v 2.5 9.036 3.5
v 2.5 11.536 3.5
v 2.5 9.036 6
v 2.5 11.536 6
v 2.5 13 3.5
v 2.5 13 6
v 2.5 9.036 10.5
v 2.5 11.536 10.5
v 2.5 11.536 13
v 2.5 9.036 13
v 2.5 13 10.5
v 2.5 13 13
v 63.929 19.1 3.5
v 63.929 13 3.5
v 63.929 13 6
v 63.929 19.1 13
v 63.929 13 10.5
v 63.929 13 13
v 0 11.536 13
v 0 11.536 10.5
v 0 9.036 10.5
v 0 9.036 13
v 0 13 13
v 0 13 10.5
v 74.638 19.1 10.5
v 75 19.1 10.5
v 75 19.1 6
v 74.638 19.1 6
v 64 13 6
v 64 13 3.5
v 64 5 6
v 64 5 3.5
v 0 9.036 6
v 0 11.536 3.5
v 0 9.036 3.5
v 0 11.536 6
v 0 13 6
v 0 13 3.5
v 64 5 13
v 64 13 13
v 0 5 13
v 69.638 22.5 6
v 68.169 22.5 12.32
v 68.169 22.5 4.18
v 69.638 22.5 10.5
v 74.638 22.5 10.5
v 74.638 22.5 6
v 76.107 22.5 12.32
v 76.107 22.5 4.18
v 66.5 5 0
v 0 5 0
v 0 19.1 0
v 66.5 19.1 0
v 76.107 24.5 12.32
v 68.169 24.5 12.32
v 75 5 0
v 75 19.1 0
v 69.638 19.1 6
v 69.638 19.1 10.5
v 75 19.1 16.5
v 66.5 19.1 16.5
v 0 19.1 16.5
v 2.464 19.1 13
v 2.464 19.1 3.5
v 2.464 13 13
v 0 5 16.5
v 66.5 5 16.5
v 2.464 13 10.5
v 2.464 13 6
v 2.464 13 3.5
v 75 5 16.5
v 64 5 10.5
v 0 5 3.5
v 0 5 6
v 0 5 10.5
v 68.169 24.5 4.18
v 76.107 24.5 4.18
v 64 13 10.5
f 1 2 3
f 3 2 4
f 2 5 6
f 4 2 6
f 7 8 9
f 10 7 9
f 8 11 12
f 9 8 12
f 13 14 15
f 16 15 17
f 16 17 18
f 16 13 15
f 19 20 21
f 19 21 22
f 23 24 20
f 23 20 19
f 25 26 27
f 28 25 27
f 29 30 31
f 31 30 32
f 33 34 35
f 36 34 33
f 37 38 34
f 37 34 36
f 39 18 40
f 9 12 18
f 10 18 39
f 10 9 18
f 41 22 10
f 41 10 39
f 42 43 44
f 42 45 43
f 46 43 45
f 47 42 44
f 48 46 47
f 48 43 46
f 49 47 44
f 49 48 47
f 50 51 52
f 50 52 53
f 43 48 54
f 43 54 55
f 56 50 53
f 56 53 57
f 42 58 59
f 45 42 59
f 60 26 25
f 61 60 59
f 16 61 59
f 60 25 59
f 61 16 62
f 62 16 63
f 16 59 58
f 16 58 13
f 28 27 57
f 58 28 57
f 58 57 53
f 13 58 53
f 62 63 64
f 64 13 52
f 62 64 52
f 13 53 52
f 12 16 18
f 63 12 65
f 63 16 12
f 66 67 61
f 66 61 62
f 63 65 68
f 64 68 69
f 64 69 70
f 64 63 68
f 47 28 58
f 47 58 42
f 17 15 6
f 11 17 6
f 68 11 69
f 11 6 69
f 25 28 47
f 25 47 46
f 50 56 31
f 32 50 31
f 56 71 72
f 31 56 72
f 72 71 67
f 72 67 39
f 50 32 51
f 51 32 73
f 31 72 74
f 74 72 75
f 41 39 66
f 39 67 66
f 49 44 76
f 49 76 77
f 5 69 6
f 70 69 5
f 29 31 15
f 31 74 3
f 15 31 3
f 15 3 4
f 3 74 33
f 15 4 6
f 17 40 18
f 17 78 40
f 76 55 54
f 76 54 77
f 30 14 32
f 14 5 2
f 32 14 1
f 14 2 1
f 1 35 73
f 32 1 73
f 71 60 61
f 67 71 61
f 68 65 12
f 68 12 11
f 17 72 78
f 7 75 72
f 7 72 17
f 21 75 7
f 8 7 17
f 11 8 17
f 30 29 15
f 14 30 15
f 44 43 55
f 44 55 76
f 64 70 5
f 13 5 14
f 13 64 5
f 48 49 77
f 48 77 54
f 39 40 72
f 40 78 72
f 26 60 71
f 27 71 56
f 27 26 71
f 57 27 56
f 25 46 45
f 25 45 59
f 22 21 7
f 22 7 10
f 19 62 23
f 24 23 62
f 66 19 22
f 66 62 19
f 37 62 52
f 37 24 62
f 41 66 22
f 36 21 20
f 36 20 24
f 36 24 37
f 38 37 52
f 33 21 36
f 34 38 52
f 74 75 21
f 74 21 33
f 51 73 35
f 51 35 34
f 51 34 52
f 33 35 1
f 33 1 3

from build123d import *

# Parameters (mm, degrees)
BOSS_EXTRUDE1_DEPTH  = 13
CUT_EXTRUDE1_DEPTH   = 66.5
BOSS_EXTRUDE4_DEPTH  = 6.1
CUT_EXTRUDE2_DEPTH   = 6.1
BOSS_EXTRUDE6_DEPTH  = 2.5
BOSS_EXTRUDE7_DEPTH  = 2.5
BOSS_EXTRUDE8_DEPTH  = 19.1
BOSS_EXTRUDE12_DEPTH = 9.5
BOSS_EXTRUDE13_DEPTH = 2.5
CUT_EXTRUDE4_DEPTH   = 5
CUT_EXTRUDE5_DEPTH   = 6.5
BOSS_EXTRUDE14_DEPTH = 10
CUT_EXTRUDE7_DEPTH   = 13
CUT_EXTRUDE8_DEPTH   = 5
CUT_EXTRUDE9_DEPTH   = 5
BOSS_EXTRUDE15_DEPTH = 2


with BuildPart() as part:
    # 3DSketch1 → Boss-Extrude1 (new body)
    with BuildSketch(Plane(origin=(0, 0, 0), x_dir=(0.970570246541768, 0, 0.2408181814727695), z_dir=(0, 1, 0))):
        Polygon((0, 0), (64.542921395, 16.014409068), (68.516421389, 0), (3.973499994, -16.014409068), align=None)
    extrude(amount=BOSS_EXTRUDE1_DEPTH)

    # 3DSketch2 → Cut-Extrude1 (cut)
    with BuildSketch(Plane(origin=(0, 13, 3.5), x_dir=(0, -0.8073911222578979, 0.59001658934231), z_dir=(1, 0, 0))):
        Polygon((0, 0), (10.496084589, 7.670215661), (11.971126063, 5.651737856), (1.475041473, -2.018477806), align=None)
        Polygon((14.626200715, 2.018477806), (4.130116125, -5.651737856), (5.605157599, -7.670215661), (16.101242188, 0), align=None)
    extrude(amount=CUT_EXTRUDE1_DEPTH, mode=Mode.SUBTRACT)


with BuildPart() as cut_extrude1_piece_1:
    # of the separate pieces the step leaves, piece 1, a body of its own (cut_extrude1_pieces)
    add(part.part.solids().sort_by_distance((0, 0, 10.5))[0])



with BuildPart() as cut_extrude1_piece_2:
    # of the separate pieces the step leaves, piece 2, a body of its own (cut_extrude1_pieces)
    add(part.part.solids().sort_by_distance((0, 0, 16.5))[0])


with BuildPart() as cut_extrude1_piece_3:
    # of the separate pieces the step leaves, piece 3, a body of its own (cut_extrude1_pieces)
    add(part.part.solids().sort_by_distance((0, 0, 0))[0])


with BuildPart() as cut_extrude1_piece_1_1:
    add(cut_extrude1_piece_1.part)

    add(cut_extrude1_piece_2.part)  # Boss-Extrude4 merges Cut-Extrude1 piece 2

    add(cut_extrude1_piece_3.part)  # Boss-Extrude4 merges Cut-Extrude1 piece 3
    # 3DSketch3 → Boss-Extrude4 (add)
    with BuildSketch(Plane(origin=(0, 13, 0), x_dir=(0.970570246541768, 0, 0.2408181814727695), z_dir=(0, 1, 0))):
        Polygon((0, 0), (64.542921395, 16.014409068), (68.516421389, 0), (3.973499994, -16.014409068), align=None)
    extrude(amount=BOSS_EXTRUDE4_DEPTH)

    # 3DSketch4 → Cut-Extrude2 (cut)
    with BuildSketch(Plane(origin=(2.463625992, 19.1, 3.5), x_dir=(0.9882657761690827, 0, 0.15274408549243565), z_dir=(0, 1, 0))):
        Polygon((0, 0), (60.744465433, 9.388524874), (62.195534245, 0), (1.451068812, -9.388524874), align=None)
    extrude(amount=-CUT_EXTRUDE2_DEPTH, mode=Mode.SUBTRACT)

    # 3DSketch5 → Boss-Extrude6 (add)
    with BuildSketch(Plane(origin=(0, 13, 3.5), x_dir=(0, -0.38512437764181645, 0.9228646779165425), z_dir=(-1, 0, 0))):
        Polygon((0, 0), (0.564008213, -1.351519893), (1.526819157, -3.658681588), (3.833980852, -2.695870643), (2.871169908, -0.388708949), (2.307161695, 0.962810944), align=None)
        Polygon((6.460052745, 2.695870643), (7.024060958, 1.344350751), (7.986871902, -0.962810944), (10.294033597, 0), (9.331222653, 2.307161695), (8.76721444, 3.658681588), align=None)
    extrude(amount=-BOSS_EXTRUDE6_DEPTH)

    # 3DSketch6 → Boss-Extrude7 (add)
    with BuildSketch(Plane(origin=(66.5, 0, 13), x_dir=(0, 0.8073911222578979, -0.5900165893423102), z_dir=(-1, 0, 0))):
        Polygon((0, 0), (1.475041473, 2.018477806), (11.971126063, -5.651737856), (10.496084589, -7.670215661), align=None)
        Polygon((14.626200715, -2.018477806), (4.130116125, 5.651737856), (5.605157599, 7.670215661), (16.101242188, 0), align=None)
    extrude(amount=BOSS_EXTRUDE7_DEPTH)

    # 3DSketch7 → Boss-Extrude8 (add)
    with BuildSketch(Plane(origin=(66.5, 0, 0), x_dir=(0.7713732785400773, 0, 0.6363829547955637), z_dir=(0, 1, 0))):
        Polygon((0, 0), (15.427465571, 12.727659096), (25.927784325, 0), (10.500318754, -12.727659096), align=None)
    extrude(amount=BOSS_EXTRUDE8_DEPTH)

    # 3DSketch8 → Boss-Extrude12 (add)
    with BuildSketch(Plane(origin=(76.128891267, 13, 6), x_dir=(-0.9382075830120803, 0, 0.3460730142305674), z_dir=(0, 1, 0))):
        Polygon((0, 0), (1.557328564, 4.221934124), (-1.734607538, 5.436217903), (-3.291936102, 1.214283779), align=None)
    extrude(amount=BOSS_EXTRUDE12_DEPTH)

    # 3DSketch9 → Boss-Extrude13 (add)
    with BuildSketch(Plane(origin=(75.345809824, 22.5, 11.764688466), x_dir=(0.5846855732237681, 0, -0.8112599956018993), z_dir=(0, 1, 0))):
        Polygon((0, 0), (5.702652298, 4.10997528), (8.664764649, 0), (2.962112351, -4.10997528), align=None)
    extrude(amount=BOSS_EXTRUDE13_DEPTH)

    # 3DSketch11 → Cut-Extrude4 (cut)
    with BuildSketch(Plane(origin=(0, 0, 0), x_dir=(0.9822888340033693, 0, 0.18737301457867736), z_dir=(0, -1, 0))):
        Polygon((0, 0), (3.091654741, 16.207765761), (88.059638882, 0), (84.967984141, -16.207765761), align=None)
    extrude(amount=-CUT_EXTRUDE4_DEPTH, mode=Mode.SUBTRACT)

    # 3DSketch12 → Cut-Extrude5 (cut)
    with BuildSketch(Plane(origin=(86.5, 5, 0), x_dir=(0, 0.6496523275821462, 0.7602314471705968), z_dir=(1, 0, 0))):
        Polygon((0, 0), (12.543818878, 10.719263405), (21.703916697, 0), (9.160097819, -10.719263405), align=None)
    extrude(amount=-CUT_EXTRUDE5_DEPTH, mode=Mode.SUBTRACT)

    # 3DSketch13 → Boss-Extrude14 (add)
    with BuildSketch(Plane(origin=(79.637641528, 22.5, 10.5), x_dir=(0, -0.6028330891856902, -0.7978673239222407), z_dir=(-1, 0, 0))):
        Polygon((0, 0), (2.049632503, 2.712748901), (5.640035461, 0), (3.590402958, -2.712748901), align=None)
    extrude(amount=BOSS_EXTRUDE14_DEPTH)

    # 3DSketch14 → Cut-Extrude7 (cut)
    with BuildSketch(Plane(origin=(80.41197271, 22.5, 4.735311534), x_dir=(0, 0.3350889131315588, 0.9421865103557314), z_dir=(-1, 0, 0))):
        Polygon((0, 0), (0.837722283, 2.355466276), (7.460706404, 0), (6.622984121, -2.355466276), align=None)
    extrude(amount=CUT_EXTRUDE7_DEPTH, mode=Mode.SUBTRACT)

    # 3DSketch15 → Cut-Extrude8 (cut)
    with BuildSketch(Plane(origin=(79.637641528, 22.5, 10.5), x_dir=(0, -0.6028330891856902, -0.7978673239222407), z_dir=(-1, 0, 0))):
        Polygon((0, 0), (2.049632503, 2.712748901), (5.640035461, 0), (3.590402958, -2.712748901), align=None)
    extrude(amount=CUT_EXTRUDE8_DEPTH, mode=Mode.SUBTRACT)

    # 3DSketch16 → Cut-Extrude9 (cut)
    with BuildSketch(Plane(origin=(80, 19.1, 0), x_dir=(0, -0.6496523275821462, 0.7602314471705968), z_dir=(-1, 0, 0))):
        Polygon((0, 0), (12.543818878, 10.719263405), (21.703916697, 0), (9.160097819, -10.719263405), align=None)
    extrude(amount=CUT_EXTRUDE9_DEPTH, mode=Mode.SUBTRACT)

    # 3DSketch17 → Boss-Extrude15 (add)
    with BuildSketch(Plane(origin=(68.168662732, 22.5, 12.3202178), x_dir=(0.6981467055639471, 0, -0.7159547314671559), z_dir=(0, -1, 0))):
        Polygon((0, 0), (5.828183385, -5.683218296), (11.370042327, 0), (5.541858942, 5.683218296), align=None)
    extrude(amount=-BOSS_EXTRUDE15_DEPTH)


solid = cut_extrude1_piece_1_1.part
